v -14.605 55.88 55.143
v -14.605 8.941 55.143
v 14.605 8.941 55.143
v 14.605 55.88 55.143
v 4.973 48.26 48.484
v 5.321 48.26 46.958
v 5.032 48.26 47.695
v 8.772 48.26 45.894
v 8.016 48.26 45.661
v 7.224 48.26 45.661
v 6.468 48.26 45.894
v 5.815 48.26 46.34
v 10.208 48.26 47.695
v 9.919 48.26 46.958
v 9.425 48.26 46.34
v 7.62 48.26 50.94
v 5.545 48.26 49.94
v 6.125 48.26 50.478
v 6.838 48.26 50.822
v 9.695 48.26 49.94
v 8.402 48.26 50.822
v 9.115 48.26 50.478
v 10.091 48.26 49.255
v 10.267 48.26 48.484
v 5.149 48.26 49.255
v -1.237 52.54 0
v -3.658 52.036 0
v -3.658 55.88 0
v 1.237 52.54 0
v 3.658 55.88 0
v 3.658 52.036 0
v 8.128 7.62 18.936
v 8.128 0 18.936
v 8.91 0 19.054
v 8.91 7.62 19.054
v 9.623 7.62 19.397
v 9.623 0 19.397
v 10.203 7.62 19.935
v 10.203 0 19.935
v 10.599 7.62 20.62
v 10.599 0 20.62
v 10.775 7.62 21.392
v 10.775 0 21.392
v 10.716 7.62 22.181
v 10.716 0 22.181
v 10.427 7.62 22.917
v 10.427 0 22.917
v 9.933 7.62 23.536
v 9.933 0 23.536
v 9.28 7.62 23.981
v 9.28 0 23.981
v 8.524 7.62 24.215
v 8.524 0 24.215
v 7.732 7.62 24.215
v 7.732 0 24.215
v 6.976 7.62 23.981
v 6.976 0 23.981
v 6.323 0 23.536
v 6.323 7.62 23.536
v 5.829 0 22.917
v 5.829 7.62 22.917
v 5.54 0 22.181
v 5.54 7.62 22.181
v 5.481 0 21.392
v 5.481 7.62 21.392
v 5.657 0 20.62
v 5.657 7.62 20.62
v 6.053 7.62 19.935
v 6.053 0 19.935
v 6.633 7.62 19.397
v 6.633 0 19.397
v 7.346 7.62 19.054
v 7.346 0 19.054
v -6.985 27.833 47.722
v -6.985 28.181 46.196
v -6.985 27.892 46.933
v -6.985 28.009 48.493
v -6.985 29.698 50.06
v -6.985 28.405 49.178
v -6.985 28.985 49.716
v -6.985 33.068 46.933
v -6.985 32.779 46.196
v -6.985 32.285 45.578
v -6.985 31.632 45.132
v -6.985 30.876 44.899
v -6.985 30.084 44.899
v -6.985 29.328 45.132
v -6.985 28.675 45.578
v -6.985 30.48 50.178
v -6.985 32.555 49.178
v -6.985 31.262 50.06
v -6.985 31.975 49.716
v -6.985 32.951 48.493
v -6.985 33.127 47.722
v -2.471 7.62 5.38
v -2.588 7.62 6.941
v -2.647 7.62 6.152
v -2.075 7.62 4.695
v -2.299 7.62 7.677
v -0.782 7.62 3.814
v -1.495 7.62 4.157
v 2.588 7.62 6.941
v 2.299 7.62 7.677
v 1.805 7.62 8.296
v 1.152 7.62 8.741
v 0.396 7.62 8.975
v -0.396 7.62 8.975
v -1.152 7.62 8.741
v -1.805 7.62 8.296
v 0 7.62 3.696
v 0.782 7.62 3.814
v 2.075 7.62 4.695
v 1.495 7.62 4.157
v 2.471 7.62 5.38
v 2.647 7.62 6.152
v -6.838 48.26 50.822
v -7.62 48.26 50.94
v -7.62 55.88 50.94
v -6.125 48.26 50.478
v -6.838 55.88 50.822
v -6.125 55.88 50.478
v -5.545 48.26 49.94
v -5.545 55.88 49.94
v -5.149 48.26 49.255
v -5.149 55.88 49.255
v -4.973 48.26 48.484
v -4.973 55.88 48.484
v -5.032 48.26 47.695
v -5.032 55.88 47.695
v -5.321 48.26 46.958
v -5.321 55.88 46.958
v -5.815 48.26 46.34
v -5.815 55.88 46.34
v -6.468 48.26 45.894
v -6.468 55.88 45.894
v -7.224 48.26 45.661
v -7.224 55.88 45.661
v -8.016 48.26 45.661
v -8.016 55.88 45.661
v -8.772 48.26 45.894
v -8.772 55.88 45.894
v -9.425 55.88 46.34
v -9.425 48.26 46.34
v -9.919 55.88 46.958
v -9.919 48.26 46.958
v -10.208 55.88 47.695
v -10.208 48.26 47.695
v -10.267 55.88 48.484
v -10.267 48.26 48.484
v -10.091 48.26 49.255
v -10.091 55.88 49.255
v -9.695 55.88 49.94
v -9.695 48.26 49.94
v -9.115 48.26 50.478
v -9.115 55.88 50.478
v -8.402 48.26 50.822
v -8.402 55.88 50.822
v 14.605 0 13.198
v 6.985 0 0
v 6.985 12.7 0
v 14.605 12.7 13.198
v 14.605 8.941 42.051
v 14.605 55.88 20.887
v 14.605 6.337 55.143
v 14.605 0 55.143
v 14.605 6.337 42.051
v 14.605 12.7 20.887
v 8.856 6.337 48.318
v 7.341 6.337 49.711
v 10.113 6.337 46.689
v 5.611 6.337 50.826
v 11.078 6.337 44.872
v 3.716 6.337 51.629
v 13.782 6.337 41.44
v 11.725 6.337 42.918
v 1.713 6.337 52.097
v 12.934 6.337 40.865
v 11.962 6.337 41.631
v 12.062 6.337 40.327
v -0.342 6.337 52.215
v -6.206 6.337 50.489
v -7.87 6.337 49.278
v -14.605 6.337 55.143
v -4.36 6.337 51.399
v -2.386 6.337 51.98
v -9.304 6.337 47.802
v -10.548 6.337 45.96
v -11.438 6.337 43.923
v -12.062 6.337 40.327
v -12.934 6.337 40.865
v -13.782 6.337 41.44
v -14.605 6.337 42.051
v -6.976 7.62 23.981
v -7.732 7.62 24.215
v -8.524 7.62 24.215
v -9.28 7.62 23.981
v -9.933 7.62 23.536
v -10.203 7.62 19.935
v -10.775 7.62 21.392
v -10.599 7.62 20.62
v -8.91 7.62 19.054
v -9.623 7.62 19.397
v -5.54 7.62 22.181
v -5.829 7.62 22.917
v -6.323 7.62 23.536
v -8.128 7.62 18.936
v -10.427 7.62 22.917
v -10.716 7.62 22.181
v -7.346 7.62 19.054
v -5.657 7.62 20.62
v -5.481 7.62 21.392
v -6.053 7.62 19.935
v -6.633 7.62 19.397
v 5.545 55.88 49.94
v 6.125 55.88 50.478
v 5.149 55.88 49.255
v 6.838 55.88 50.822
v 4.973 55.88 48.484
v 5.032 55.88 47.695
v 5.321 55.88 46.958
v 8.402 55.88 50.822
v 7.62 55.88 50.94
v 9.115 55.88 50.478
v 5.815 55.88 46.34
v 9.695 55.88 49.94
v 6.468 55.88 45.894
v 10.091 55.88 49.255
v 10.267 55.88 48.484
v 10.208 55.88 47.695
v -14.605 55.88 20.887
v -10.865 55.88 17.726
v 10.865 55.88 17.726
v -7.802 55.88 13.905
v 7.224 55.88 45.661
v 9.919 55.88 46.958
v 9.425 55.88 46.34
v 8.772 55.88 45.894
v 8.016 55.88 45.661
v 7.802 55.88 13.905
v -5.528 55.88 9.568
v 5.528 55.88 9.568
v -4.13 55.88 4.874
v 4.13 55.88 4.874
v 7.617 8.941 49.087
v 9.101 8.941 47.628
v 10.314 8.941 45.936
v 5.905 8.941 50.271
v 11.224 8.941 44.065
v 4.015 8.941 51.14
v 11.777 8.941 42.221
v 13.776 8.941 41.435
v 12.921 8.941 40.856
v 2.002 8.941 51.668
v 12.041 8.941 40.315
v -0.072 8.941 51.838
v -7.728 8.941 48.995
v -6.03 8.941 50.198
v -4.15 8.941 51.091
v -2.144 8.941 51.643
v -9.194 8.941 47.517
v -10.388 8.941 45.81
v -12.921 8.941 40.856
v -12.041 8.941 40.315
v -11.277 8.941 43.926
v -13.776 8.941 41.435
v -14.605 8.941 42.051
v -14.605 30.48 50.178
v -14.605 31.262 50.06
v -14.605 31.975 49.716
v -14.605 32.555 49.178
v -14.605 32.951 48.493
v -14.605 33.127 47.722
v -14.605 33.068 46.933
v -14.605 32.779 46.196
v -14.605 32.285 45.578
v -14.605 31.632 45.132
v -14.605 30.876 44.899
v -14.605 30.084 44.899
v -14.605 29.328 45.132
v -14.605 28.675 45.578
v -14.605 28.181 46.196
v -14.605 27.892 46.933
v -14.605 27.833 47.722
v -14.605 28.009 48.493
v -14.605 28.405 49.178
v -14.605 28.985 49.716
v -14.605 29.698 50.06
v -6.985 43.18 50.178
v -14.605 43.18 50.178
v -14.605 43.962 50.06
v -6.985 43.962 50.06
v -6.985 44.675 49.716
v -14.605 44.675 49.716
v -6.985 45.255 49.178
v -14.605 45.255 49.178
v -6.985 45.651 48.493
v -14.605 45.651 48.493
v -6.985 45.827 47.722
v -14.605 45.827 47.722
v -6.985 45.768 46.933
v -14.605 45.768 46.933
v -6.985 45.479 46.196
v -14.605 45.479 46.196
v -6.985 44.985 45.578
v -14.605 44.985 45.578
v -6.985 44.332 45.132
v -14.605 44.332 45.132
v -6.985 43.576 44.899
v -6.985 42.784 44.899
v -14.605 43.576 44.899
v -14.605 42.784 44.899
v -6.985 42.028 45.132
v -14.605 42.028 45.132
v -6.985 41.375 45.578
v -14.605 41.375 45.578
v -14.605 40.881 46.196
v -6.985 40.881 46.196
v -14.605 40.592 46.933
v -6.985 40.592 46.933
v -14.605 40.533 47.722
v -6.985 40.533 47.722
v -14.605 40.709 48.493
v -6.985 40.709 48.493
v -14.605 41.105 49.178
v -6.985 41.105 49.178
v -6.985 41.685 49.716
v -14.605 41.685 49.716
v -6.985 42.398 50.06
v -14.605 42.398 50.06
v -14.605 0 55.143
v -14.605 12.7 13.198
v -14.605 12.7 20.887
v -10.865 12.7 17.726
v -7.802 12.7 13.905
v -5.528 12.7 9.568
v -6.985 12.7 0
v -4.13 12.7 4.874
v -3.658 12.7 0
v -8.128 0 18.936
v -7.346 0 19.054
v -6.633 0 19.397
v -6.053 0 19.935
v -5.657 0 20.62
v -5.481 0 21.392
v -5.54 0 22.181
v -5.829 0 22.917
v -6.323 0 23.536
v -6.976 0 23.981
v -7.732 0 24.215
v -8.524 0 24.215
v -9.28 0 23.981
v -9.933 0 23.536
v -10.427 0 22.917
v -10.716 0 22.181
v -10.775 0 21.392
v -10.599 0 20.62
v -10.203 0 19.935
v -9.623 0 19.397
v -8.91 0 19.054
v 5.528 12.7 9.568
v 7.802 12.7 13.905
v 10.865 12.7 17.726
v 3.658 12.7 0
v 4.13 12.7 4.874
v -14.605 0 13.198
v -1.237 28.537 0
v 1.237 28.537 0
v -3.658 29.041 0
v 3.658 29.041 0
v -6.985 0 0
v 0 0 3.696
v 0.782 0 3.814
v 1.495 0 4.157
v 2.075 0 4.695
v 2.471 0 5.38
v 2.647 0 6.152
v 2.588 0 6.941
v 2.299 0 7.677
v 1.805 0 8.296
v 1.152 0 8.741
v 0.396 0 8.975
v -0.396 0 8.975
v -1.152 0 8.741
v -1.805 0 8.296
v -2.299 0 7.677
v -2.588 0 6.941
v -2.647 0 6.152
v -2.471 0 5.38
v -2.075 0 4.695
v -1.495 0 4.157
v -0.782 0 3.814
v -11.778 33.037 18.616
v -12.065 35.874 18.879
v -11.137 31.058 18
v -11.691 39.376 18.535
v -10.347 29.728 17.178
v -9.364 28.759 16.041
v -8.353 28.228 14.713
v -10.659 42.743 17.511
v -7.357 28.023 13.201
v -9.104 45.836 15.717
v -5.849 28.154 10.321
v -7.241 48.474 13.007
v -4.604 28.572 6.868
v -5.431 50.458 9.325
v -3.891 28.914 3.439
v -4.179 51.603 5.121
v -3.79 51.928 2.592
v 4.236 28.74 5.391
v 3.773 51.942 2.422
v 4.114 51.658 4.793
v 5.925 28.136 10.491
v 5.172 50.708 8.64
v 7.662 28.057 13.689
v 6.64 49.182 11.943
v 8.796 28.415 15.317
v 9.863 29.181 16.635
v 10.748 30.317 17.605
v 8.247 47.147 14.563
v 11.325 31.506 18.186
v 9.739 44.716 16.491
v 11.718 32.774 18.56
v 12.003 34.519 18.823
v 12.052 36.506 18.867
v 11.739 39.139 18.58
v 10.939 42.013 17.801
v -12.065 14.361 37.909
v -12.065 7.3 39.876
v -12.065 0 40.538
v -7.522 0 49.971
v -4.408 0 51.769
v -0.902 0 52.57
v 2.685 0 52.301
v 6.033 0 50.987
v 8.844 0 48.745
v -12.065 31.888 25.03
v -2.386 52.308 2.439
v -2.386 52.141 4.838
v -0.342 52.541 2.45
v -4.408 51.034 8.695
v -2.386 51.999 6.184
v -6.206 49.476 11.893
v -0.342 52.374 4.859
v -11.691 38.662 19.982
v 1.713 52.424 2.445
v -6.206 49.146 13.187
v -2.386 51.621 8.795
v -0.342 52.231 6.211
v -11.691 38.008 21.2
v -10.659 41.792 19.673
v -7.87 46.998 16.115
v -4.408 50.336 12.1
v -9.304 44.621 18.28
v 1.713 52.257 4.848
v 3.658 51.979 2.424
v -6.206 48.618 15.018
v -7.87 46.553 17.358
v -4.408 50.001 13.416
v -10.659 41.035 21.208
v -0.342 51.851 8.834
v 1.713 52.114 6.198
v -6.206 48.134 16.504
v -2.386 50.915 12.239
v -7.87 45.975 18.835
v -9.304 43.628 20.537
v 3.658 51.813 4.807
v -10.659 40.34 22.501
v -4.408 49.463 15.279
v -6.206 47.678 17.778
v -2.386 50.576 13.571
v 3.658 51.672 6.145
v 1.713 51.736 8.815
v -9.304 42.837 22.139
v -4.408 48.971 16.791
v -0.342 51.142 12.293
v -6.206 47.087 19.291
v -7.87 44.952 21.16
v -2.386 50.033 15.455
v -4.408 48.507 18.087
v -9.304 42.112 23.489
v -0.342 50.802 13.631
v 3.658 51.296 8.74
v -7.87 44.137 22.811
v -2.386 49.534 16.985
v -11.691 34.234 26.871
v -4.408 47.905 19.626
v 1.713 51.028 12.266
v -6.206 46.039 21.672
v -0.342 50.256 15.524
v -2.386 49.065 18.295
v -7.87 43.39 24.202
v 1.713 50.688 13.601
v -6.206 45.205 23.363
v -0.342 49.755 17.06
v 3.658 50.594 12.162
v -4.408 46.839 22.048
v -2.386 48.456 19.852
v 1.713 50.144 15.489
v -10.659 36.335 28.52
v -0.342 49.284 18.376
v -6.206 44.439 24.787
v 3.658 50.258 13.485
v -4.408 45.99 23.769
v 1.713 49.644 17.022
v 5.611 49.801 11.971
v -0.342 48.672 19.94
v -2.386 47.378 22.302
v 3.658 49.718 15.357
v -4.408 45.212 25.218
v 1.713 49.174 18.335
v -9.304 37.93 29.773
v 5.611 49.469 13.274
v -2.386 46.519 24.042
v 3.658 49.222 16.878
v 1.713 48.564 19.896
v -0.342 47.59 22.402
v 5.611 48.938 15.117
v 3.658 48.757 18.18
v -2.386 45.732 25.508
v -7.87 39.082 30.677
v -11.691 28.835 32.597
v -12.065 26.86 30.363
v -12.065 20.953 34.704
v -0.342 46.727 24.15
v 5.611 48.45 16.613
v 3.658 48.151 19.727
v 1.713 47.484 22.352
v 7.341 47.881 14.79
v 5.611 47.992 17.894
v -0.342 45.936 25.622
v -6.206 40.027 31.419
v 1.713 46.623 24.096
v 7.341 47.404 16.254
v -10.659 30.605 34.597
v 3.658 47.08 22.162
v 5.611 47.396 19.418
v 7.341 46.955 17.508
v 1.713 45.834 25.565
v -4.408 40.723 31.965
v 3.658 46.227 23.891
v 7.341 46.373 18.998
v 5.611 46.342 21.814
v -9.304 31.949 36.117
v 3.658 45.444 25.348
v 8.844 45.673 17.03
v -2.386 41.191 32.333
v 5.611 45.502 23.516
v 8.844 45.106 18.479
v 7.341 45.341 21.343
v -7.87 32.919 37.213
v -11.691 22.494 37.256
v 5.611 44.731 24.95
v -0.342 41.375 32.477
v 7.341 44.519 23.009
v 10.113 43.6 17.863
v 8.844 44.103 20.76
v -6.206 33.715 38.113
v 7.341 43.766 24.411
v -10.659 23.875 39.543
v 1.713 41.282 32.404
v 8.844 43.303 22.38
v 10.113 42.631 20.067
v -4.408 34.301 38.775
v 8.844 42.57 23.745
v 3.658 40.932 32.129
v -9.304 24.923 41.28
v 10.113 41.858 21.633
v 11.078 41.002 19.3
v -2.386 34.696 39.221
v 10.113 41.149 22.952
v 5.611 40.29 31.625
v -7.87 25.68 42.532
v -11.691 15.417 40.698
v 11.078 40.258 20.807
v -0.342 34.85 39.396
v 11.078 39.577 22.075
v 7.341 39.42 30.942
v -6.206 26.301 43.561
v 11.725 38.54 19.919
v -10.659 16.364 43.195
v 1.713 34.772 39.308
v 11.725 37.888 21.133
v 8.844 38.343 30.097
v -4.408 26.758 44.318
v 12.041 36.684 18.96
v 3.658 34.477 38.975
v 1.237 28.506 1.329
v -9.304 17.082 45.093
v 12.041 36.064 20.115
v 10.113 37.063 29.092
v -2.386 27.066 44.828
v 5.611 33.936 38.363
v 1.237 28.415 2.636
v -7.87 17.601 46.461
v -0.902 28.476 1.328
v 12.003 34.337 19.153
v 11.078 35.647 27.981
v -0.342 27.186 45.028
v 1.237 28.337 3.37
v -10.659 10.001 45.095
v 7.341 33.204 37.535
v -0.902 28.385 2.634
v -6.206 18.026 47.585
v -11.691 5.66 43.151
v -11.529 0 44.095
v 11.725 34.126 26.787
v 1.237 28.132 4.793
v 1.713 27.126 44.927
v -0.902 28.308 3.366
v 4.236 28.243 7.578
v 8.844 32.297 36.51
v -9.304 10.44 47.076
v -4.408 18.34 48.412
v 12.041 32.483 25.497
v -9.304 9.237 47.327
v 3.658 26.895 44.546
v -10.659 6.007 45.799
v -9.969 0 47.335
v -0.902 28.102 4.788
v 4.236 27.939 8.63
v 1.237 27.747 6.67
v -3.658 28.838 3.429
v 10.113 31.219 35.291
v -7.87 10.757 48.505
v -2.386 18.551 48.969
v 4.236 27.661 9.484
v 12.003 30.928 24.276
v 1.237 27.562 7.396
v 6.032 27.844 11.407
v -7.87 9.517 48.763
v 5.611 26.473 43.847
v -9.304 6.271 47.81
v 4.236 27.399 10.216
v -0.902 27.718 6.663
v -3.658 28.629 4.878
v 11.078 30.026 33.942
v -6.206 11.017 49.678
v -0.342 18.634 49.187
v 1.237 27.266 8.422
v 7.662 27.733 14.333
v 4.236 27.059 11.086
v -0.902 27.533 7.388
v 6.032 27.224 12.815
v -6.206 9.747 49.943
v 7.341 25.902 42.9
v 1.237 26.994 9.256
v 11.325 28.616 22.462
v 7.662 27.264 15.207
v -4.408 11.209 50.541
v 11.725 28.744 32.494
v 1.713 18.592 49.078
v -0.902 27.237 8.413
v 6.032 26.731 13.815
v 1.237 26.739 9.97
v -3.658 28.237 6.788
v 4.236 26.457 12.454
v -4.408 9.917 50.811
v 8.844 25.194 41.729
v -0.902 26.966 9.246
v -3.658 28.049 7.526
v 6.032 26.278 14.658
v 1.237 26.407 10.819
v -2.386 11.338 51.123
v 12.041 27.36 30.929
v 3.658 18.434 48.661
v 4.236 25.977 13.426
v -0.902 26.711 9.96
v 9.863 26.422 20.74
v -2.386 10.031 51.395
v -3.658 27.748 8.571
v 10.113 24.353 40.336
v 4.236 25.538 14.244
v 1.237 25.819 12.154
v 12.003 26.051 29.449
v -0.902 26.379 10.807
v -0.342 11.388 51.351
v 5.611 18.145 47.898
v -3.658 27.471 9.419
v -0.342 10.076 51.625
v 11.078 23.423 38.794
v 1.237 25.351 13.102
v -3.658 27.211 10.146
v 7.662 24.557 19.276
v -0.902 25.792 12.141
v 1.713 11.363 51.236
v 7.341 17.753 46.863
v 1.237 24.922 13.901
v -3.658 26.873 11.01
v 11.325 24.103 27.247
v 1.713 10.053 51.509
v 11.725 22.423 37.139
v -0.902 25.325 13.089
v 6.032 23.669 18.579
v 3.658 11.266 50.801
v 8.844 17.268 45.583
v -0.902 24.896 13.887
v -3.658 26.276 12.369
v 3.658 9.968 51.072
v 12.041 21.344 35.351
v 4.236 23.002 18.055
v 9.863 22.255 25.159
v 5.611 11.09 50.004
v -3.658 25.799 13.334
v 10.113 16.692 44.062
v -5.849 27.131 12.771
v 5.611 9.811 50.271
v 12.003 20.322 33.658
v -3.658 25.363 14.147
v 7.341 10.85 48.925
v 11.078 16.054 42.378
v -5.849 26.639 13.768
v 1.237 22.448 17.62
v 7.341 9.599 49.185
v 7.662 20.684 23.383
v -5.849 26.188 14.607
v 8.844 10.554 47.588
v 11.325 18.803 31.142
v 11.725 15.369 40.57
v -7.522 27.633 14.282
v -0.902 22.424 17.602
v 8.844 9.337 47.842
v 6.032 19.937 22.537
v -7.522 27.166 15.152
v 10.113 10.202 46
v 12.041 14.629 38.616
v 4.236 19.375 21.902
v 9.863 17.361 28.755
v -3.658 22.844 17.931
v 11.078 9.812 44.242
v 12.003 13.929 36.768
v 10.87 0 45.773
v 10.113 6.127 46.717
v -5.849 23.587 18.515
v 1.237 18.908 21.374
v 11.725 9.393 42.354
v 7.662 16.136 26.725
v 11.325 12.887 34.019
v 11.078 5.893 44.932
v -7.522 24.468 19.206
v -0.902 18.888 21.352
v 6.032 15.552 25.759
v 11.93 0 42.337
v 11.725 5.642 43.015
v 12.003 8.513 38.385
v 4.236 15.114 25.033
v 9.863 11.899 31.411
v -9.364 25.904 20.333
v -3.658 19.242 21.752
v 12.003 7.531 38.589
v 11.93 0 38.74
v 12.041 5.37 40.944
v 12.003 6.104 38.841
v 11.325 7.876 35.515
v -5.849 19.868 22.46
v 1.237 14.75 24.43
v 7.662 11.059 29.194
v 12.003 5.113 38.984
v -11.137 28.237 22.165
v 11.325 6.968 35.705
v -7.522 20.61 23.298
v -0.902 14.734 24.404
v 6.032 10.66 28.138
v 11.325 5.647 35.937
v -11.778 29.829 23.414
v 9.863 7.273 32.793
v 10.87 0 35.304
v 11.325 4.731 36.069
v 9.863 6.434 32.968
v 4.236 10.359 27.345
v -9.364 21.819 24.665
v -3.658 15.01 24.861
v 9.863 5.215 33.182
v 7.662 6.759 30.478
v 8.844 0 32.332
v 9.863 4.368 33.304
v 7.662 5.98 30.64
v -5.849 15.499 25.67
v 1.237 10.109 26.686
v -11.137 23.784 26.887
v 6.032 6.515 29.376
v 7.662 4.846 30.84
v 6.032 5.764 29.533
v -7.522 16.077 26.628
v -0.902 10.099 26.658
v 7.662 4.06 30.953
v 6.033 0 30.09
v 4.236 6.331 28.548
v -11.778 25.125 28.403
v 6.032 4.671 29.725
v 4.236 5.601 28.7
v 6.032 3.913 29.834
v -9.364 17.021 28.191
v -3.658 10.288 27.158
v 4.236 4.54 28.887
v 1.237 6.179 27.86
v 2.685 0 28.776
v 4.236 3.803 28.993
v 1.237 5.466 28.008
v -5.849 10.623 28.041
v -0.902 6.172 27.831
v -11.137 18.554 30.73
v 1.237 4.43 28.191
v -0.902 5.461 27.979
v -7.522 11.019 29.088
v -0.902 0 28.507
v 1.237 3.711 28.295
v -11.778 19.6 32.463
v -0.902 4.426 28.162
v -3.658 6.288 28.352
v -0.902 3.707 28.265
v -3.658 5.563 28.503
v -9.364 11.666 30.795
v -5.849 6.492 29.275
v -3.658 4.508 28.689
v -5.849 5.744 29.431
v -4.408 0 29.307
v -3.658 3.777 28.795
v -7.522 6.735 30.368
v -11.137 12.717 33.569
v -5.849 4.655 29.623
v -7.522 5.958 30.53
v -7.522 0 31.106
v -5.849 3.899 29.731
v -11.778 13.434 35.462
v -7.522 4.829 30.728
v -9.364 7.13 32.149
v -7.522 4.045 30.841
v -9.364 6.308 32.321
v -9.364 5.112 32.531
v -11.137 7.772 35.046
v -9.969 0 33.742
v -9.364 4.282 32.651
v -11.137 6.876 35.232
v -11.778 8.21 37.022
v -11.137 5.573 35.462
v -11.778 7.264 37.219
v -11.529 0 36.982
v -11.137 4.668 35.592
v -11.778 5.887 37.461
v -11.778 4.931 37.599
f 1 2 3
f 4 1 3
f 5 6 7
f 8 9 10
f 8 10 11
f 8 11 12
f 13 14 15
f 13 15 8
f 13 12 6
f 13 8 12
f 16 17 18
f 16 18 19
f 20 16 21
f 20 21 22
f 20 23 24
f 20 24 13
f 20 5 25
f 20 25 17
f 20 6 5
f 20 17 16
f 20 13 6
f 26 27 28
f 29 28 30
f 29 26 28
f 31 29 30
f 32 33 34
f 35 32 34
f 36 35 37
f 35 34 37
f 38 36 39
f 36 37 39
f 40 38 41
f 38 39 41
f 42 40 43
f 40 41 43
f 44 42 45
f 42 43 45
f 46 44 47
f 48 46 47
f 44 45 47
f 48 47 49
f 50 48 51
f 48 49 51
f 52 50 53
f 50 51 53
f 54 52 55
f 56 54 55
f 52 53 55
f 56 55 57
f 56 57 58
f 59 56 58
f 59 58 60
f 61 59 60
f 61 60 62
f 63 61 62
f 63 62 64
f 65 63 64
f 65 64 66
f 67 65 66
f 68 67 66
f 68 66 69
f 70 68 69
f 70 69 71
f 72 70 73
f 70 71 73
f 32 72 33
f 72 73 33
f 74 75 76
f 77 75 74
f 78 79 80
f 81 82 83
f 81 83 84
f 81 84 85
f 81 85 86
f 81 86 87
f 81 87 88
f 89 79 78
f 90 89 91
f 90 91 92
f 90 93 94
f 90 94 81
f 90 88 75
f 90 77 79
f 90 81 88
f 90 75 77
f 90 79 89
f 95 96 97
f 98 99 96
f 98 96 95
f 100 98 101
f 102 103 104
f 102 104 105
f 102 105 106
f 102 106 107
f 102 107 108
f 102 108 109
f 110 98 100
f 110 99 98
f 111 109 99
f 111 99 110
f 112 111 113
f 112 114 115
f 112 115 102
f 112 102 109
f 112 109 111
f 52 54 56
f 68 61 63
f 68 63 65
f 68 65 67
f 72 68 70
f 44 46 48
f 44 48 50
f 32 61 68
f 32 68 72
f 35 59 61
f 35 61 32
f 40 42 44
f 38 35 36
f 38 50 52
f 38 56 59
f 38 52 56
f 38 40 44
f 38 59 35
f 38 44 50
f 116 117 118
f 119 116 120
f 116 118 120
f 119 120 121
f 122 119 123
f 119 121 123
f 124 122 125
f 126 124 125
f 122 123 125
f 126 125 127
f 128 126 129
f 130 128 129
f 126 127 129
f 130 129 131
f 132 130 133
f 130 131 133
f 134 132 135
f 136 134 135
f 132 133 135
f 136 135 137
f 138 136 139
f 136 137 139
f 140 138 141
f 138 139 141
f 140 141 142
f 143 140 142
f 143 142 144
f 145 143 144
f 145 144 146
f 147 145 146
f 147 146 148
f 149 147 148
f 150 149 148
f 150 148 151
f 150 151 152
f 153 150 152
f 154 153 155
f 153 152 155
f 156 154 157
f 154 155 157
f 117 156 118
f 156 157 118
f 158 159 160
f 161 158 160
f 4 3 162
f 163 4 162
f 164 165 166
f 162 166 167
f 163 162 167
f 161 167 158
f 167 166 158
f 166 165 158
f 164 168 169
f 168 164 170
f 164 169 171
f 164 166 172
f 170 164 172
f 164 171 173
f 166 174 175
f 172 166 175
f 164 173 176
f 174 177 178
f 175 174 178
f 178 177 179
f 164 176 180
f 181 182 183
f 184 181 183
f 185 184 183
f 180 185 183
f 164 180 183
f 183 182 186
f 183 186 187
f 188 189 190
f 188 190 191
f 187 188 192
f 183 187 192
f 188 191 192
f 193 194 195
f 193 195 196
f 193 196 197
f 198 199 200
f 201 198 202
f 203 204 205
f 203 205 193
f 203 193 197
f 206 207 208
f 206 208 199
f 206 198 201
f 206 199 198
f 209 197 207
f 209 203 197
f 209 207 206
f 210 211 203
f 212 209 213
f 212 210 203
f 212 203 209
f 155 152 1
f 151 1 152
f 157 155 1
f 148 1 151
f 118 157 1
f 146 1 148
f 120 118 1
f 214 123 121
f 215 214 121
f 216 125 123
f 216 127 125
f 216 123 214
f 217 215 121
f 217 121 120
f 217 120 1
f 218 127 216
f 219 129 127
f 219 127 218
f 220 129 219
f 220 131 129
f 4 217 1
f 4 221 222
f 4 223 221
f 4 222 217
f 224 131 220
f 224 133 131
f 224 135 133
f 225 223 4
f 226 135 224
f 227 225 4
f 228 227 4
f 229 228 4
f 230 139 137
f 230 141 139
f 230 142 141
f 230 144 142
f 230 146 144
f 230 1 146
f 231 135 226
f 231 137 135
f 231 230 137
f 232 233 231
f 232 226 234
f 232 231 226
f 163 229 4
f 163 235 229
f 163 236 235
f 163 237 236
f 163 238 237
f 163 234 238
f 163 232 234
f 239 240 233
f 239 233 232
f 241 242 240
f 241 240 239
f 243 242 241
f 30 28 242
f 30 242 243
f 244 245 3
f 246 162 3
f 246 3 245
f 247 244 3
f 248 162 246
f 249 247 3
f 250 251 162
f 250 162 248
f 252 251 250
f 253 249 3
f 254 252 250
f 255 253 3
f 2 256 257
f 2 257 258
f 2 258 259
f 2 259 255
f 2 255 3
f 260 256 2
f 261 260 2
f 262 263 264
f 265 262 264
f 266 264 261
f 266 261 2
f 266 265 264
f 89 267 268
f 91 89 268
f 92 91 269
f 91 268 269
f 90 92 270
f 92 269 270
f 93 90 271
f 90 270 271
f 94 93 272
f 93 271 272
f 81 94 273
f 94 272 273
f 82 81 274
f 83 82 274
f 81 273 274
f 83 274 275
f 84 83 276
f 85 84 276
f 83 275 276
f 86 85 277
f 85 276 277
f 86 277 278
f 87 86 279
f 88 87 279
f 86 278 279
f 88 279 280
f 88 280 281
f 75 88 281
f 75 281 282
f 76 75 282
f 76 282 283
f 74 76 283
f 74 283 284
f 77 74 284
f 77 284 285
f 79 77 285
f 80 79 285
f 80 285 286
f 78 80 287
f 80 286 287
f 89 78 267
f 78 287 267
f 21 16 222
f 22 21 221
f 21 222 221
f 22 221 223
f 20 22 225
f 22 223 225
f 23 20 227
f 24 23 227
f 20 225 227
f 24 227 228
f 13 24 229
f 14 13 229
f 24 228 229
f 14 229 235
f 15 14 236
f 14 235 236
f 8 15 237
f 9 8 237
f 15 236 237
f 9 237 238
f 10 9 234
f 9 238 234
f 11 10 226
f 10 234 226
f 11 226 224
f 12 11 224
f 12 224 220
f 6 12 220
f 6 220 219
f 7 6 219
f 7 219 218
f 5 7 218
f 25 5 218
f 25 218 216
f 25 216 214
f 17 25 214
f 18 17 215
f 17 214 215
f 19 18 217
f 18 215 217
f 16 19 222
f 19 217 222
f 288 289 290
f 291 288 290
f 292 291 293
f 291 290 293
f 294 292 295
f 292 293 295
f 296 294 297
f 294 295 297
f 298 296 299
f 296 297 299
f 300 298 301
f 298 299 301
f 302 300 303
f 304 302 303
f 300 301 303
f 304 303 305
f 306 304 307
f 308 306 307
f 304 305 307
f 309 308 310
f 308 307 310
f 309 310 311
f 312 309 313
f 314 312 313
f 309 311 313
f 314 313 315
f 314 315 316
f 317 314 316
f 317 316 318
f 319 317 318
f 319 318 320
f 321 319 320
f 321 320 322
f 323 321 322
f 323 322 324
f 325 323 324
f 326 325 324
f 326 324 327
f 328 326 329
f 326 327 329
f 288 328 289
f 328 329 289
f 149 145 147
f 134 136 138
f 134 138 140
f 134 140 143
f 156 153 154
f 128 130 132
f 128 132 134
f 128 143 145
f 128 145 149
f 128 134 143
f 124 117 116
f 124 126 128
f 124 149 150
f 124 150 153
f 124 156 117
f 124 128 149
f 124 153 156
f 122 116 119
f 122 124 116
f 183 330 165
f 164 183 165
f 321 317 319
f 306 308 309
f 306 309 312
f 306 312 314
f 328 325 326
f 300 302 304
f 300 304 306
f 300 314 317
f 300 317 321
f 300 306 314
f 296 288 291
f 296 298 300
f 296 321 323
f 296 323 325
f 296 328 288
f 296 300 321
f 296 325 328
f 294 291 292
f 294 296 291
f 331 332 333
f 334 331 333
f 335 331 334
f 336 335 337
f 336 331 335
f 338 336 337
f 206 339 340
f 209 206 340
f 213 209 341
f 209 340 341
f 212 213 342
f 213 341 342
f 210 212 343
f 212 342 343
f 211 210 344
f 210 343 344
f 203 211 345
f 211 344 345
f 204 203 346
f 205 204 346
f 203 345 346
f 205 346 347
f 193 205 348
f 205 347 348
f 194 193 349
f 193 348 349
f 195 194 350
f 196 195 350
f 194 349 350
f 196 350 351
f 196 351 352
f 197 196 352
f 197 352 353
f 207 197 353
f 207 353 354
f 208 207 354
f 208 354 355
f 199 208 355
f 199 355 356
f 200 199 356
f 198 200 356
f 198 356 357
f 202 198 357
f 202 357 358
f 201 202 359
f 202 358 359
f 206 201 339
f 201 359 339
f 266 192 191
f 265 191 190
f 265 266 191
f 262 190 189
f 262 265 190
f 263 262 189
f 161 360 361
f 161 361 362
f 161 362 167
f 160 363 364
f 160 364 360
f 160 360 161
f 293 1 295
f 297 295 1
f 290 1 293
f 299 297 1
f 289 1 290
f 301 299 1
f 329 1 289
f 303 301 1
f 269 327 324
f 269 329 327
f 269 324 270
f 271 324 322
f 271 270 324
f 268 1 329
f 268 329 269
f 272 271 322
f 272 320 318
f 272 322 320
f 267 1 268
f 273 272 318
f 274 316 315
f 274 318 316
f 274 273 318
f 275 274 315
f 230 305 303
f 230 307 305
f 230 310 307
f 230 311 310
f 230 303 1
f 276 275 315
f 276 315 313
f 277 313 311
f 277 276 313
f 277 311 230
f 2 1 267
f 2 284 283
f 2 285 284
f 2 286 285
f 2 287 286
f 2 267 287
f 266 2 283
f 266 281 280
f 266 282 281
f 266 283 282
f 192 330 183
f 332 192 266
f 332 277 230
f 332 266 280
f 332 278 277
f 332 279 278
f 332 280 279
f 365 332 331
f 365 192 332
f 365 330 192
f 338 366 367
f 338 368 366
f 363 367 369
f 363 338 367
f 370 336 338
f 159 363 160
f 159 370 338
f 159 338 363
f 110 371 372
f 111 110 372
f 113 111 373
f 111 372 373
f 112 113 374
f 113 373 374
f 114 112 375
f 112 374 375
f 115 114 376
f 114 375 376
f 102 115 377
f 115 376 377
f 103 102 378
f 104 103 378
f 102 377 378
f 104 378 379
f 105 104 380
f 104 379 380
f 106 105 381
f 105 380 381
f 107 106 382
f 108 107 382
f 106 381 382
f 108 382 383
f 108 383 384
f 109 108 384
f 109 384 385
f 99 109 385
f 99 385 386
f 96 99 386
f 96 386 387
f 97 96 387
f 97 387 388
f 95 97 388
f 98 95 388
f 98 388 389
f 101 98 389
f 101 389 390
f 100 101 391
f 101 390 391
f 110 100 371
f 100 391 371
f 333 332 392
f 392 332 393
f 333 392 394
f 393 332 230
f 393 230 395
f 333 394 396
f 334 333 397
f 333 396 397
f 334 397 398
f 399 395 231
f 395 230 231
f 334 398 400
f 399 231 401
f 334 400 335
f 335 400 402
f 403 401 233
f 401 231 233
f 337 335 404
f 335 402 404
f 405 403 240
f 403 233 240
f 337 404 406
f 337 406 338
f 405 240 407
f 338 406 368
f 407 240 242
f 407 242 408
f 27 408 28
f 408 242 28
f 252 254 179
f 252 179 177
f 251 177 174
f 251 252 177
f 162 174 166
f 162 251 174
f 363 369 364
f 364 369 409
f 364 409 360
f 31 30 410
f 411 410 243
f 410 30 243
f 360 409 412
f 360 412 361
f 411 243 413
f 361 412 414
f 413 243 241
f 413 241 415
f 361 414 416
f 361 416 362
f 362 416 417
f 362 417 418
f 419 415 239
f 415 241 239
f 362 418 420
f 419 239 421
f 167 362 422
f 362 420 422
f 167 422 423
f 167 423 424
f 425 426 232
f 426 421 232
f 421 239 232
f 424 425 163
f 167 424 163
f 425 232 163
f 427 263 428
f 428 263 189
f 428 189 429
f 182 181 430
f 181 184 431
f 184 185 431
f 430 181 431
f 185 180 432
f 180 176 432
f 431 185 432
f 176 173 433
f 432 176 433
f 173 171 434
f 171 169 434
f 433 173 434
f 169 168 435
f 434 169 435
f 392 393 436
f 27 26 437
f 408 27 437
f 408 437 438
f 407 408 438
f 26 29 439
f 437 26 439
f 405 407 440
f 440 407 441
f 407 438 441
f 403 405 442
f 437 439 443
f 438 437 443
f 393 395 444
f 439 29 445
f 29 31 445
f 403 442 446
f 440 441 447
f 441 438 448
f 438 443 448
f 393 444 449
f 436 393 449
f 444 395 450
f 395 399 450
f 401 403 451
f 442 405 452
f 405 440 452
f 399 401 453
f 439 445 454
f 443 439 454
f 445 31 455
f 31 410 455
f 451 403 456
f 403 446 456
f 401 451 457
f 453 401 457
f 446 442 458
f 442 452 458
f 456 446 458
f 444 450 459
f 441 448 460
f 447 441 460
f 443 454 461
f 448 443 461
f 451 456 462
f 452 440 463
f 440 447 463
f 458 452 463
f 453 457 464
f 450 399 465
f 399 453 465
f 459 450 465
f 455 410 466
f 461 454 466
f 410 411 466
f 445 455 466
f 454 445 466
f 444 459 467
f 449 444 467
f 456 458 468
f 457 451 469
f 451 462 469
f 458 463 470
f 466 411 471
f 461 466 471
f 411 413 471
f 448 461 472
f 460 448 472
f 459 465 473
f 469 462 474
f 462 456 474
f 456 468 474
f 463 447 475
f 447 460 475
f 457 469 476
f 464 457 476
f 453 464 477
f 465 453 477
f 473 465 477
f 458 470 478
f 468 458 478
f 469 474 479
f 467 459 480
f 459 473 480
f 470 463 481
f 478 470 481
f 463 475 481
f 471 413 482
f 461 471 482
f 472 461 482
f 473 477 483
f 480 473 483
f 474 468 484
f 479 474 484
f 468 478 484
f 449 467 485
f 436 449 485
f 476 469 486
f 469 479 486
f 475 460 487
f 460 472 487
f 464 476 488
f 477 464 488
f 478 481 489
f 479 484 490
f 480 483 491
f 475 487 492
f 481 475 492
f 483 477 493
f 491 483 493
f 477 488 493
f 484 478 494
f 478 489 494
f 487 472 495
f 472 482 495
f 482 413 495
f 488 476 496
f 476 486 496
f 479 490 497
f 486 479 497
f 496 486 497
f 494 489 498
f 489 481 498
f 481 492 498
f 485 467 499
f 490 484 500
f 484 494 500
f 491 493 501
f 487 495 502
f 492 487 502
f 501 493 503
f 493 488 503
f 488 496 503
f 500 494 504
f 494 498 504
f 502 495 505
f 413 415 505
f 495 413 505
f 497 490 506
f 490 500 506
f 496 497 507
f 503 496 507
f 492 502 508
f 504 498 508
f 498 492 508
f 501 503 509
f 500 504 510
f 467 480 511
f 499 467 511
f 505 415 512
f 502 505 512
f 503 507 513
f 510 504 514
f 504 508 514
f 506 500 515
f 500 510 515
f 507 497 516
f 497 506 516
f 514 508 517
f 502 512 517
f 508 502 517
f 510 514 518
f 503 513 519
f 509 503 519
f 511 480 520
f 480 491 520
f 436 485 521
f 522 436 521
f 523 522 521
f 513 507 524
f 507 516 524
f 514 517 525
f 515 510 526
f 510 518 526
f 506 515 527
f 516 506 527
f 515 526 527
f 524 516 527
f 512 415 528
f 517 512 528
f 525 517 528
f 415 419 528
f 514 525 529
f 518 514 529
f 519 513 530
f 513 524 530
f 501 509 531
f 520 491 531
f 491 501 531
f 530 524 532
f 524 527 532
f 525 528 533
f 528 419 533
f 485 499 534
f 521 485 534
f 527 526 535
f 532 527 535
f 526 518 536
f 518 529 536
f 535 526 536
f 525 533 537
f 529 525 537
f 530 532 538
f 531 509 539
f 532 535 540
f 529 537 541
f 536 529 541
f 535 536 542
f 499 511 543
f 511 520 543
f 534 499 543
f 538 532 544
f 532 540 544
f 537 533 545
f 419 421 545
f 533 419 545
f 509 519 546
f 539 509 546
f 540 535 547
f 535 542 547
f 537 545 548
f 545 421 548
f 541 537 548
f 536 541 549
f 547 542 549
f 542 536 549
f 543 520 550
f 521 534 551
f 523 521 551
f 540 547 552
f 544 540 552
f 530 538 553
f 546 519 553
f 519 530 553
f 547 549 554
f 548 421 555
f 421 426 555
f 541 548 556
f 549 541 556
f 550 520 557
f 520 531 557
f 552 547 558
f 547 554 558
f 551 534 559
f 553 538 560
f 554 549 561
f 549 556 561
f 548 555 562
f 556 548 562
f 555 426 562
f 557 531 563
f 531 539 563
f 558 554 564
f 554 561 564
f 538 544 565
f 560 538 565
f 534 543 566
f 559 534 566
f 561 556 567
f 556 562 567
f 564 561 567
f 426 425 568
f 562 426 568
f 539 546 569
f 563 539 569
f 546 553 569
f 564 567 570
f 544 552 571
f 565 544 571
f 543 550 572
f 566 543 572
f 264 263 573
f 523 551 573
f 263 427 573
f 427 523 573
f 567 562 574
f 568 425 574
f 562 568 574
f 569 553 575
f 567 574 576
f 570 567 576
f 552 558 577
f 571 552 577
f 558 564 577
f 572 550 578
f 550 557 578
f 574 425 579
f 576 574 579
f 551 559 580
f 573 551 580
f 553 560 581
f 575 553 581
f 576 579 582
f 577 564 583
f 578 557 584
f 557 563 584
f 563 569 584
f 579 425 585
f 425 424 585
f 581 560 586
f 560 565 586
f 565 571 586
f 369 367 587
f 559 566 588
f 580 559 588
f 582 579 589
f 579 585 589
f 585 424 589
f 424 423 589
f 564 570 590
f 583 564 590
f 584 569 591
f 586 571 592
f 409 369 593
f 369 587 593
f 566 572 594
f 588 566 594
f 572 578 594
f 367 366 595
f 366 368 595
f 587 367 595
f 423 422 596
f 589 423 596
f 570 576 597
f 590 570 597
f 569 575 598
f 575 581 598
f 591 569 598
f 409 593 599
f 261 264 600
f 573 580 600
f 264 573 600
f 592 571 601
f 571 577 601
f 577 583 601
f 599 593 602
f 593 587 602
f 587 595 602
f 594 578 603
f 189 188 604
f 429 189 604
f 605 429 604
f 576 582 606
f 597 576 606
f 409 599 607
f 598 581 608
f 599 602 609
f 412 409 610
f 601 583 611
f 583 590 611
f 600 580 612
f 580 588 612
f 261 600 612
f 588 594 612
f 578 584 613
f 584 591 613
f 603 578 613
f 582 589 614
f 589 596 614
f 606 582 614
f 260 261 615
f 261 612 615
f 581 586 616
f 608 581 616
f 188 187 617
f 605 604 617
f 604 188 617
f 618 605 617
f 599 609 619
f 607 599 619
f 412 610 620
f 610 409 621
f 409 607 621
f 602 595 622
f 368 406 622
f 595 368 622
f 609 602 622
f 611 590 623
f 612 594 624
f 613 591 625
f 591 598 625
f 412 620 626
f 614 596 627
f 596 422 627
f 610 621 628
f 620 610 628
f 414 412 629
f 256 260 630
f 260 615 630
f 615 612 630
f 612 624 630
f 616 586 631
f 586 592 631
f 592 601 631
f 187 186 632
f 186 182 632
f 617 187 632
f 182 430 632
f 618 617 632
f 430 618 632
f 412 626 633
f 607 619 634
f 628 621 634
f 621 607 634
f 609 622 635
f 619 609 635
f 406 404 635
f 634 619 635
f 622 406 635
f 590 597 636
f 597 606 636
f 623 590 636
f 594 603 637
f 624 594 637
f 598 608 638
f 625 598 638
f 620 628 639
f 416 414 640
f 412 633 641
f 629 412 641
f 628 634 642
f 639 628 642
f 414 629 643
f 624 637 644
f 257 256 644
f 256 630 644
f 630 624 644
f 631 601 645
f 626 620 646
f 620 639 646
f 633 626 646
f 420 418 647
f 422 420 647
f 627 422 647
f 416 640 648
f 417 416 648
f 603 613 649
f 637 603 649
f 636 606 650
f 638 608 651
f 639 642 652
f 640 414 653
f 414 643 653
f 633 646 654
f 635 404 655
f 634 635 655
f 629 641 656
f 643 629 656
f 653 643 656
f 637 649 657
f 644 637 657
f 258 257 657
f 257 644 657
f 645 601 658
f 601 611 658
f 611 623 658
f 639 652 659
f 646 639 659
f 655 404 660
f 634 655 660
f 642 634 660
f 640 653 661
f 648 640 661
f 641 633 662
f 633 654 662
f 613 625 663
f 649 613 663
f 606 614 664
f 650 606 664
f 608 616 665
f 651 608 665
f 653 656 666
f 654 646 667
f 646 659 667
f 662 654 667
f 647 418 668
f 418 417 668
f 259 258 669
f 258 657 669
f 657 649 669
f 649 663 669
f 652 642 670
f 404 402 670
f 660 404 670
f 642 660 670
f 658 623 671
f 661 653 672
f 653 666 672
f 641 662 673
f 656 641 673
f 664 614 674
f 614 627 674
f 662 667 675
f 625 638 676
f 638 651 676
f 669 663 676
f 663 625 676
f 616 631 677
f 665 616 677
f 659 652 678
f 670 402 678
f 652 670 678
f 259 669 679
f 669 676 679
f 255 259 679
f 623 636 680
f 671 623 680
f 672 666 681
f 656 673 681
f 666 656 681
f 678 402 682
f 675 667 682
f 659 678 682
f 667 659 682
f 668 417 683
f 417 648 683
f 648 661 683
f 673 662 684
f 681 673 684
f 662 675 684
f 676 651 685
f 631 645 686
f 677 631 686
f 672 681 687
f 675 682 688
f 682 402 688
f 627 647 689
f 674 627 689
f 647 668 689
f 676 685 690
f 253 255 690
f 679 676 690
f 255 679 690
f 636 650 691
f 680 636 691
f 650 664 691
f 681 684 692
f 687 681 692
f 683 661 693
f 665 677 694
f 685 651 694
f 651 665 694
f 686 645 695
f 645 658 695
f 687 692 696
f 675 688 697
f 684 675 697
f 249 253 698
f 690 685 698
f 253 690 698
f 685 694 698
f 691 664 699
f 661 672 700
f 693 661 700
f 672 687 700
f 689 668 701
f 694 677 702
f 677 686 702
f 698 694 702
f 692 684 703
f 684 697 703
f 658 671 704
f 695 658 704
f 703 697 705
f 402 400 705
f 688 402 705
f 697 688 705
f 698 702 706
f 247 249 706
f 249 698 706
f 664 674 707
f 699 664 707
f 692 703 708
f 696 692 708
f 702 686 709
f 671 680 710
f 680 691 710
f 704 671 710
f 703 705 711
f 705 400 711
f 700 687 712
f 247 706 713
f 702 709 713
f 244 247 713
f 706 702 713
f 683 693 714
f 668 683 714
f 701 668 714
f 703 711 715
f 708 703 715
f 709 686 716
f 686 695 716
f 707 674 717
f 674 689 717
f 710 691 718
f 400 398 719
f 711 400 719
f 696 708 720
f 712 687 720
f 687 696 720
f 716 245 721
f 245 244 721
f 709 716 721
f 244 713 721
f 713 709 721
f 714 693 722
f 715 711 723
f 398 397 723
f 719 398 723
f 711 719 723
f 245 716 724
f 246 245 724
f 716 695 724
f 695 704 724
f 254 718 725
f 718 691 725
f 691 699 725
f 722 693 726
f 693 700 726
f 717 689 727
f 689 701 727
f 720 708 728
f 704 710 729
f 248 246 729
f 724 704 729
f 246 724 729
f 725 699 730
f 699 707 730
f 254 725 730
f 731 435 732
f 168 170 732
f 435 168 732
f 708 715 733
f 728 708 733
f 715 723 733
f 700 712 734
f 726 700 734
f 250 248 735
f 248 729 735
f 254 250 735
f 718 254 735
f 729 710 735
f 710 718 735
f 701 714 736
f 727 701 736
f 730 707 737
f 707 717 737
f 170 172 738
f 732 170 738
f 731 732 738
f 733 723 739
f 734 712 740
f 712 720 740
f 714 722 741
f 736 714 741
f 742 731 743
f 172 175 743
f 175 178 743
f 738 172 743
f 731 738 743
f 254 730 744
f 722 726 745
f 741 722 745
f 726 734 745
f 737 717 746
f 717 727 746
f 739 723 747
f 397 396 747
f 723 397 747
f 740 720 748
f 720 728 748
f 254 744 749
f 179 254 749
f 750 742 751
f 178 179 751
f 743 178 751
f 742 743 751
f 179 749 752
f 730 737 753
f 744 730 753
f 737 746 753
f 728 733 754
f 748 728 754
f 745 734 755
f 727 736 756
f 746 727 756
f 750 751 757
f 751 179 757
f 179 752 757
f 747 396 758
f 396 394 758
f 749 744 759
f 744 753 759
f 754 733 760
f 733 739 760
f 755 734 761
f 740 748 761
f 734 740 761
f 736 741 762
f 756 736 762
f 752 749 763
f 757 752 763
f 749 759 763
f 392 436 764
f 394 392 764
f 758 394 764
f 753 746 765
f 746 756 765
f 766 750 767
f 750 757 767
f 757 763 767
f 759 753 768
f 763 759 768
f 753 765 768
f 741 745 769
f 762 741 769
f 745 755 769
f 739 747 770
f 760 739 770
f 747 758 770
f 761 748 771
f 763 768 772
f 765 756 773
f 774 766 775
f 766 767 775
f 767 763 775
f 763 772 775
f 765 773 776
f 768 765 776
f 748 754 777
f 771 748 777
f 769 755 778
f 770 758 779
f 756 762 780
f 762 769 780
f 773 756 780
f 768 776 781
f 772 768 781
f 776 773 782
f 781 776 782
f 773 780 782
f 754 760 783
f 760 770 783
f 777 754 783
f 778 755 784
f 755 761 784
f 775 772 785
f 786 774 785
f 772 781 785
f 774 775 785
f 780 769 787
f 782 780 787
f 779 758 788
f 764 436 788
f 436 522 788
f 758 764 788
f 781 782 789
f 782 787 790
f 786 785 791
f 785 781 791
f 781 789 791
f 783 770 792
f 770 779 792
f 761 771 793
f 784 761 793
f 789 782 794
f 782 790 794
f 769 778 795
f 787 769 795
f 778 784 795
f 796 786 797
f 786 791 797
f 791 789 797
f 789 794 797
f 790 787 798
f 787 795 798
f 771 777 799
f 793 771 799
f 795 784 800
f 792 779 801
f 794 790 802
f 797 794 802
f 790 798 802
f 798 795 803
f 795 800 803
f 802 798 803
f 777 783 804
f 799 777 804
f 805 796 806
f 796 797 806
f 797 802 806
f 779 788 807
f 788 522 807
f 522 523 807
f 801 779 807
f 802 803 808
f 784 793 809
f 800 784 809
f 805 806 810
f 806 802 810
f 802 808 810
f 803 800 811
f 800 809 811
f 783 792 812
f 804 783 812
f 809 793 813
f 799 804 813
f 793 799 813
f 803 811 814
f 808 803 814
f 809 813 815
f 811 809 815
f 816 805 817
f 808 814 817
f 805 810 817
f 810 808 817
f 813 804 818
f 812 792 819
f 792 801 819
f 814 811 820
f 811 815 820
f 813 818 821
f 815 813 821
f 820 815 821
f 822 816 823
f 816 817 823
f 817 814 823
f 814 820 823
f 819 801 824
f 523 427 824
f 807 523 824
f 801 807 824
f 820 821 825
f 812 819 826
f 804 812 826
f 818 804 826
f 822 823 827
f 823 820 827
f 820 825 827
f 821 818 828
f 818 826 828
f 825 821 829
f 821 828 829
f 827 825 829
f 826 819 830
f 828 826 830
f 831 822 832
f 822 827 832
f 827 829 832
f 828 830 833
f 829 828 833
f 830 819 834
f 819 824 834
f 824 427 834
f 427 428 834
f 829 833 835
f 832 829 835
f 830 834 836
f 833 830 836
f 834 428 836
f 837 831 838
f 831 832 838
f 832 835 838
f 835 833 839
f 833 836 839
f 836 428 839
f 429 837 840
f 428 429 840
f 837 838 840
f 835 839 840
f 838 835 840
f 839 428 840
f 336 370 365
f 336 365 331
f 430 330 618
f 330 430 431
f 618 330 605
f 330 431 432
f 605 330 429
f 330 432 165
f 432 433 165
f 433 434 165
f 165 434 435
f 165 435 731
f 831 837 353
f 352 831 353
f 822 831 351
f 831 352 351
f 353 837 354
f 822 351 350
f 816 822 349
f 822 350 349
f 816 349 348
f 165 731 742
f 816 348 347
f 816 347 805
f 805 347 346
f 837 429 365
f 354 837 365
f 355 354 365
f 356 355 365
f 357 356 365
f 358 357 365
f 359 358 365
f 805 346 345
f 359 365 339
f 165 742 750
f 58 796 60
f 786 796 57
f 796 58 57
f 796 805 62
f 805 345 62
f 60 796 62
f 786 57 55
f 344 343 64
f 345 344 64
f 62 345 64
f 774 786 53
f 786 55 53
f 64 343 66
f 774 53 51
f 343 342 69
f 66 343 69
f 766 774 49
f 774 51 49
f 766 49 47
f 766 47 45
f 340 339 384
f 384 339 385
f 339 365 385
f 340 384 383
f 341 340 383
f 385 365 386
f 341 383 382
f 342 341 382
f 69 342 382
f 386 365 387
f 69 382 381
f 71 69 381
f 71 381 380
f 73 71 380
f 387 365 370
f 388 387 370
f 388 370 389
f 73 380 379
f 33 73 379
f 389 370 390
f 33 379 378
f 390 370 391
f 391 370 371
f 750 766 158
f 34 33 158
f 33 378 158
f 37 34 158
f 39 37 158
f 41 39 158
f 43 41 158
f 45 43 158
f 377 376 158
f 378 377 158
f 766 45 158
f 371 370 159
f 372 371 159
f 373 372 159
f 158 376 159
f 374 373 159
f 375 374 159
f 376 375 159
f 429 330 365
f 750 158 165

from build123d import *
from build123d.topology import SkipClean

# Parameters (mm, degrees)
SKETCH1_W               = 29.21
SKETCH1_H               = 55.1434
BOSS_EXTRUDE1_DEPTH     = 55.88
SKETCH2_R               = 12.065
CUT_REVOLVE1_ANGLE      = 90
SKETCH3_R               = 25.4
CUT_EXTRUDE1_DEPTH      = 43.18
CUT_EXTRUDE4_DEPTH      = 2.0955
CUT_EXTRUDE4_DEPTH_BACK = 0.508
SKETCH6_R               = 23.8125
SKETCH7_R               = 2.6543
CUT_EXTRUDE5_DEPTH      = 7.62
CHAMFER1_SIZE           = 7.62
CHAMFER1_SIZE2          = 13.198227154
SKETCH8_R               = 2.6543
CUT_EXTRUDE6_DEPTH      = 7.62
SKETCH9_R               = 2.6543
CUT_EXTRUDE7_DEPTH      = 7.62


with BuildPart() as part:
    # Sketch1 → Boss-Extrude1 (new body)
    with BuildSketch(Plane(origin=(0, 0, 0), x_dir=(1, 0, 0), z_dir=(0, 1, 0))):
        with Locations((0, -27.5717)):
            Rectangle(SKETCH1_W, SKETCH1_H)
    extrude(amount=BOSS_EXTRUDE1_DEPTH)

    # Sketch2 → Cut-Revolve1 (revolve, cut)
    with BuildSketch(Plane(origin=(0, 0, 0), x_dir=(-1, 0, 0), z_dir=(0, 0, -1))):
        with Locations((0, 40.5384)):
            Circle(SKETCH2_R)
    revolve(axis=Axis((14.605, 0, 0), (1, 0, 0)), revolution_arc=CUT_REVOLVE1_ANGLE, mode=Mode.SUBTRACT)

    # Sketch3 → Cut-Extrude1 (cut)
    with BuildSketch(Plane(origin=(0, 55.88, 0), x_dir=(1, 0, 0), z_dir=(0, 1, 0))):
        with Locations((-29.0576, 0)):
            Circle(SKETCH3_R)
        with Locations((29.0576, 0)):
            Circle(SKETCH3_R)
    extrude(amount=-CUT_EXTRUDE1_DEPTH, mode=Mode.SUBTRACT)

    # Sketch6 → Cut-Extrude4 (cut, two sides: drawn at the far end of the back side and taken through both)
    with SkipClean():  # the faces are left unmerged after this step: merging them gives an invalid solid
        with BuildSketch(Plane(origin=(0, 8.4328, 0), x_dir=(-1, 0, 0), z_dir=(0, -1, 0)).offset(-CUT_EXTRUDE4_DEPTH_BACK)):
            with Locations((0, -60.8584)):
                Circle(SKETCH6_R)
        extrude(amount=CUT_EXTRUDE4_DEPTH + CUT_EXTRUDE4_DEPTH_BACK, mode=Mode.SUBTRACT)

    # Sketch7 → Cut-Extrude5 (cut)
    with SkipClean():  # the faces are left unmerged after this step: merging them gives an invalid solid
        with BuildSketch(Plane.XZ):
            with Locations((0, 6.35)):
                Circle(SKETCH7_R)
            with Locations((-8.128, 21.59)):
                Circle(SKETCH7_R)
            with Locations((8.128, 21.59)):
                Circle(SKETCH7_R)
        extrude(amount=-CUT_EXTRUDE5_DEPTH, mode=Mode.SUBTRACT)

    # Chamfer1
    chamfer1_edges = [part.edges().sort_by_distance(p)[0] for p in [
        (14.605, 6.35, 0),
        (-14.605, 6.35, 0),
    ]]
    chamfer1_side = [part.faces().sort_by_distance(p)[0] for p in [
        (0, 9.780788916, 0),
    ]]
    chamfer(chamfer1_edges, length=CHAMFER1_SIZE, length2=CHAMFER1_SIZE2, reference=chamfer1_side[0])

    # Sketch8 → Cut-Extrude6 (cut)
    with SkipClean():  # the faces are left unmerged after this step: merging them gives an invalid solid
        with BuildSketch(Plane(origin=(0, 55.88, 0), x_dir=(1, 0, 0), z_dir=(0, 1, 0))):
            with Locations((-7.62, -48.2854)):
                Circle(SKETCH8_R)
            with Locations((7.62, -48.2854)):
                Circle(SKETCH8_R)
        extrude(amount=-CUT_EXTRUDE6_DEPTH, mode=Mode.SUBTRACT)

    # Sketch9 → Cut-Extrude7 (cut)
    with SkipClean():  # the faces are left unmerged after this step: merging them gives an invalid solid
        with BuildSketch(Plane.ZY.offset(14.605)):
            with Locations((47.5234, 43.18)):
                Circle(SKETCH9_R)
            with Locations((47.5234, 30.48)):
                Circle(SKETCH9_R)
        extrude(amount=-CUT_EXTRUDE7_DEPTH, mode=Mode.SUBTRACT)


solid = part.part
